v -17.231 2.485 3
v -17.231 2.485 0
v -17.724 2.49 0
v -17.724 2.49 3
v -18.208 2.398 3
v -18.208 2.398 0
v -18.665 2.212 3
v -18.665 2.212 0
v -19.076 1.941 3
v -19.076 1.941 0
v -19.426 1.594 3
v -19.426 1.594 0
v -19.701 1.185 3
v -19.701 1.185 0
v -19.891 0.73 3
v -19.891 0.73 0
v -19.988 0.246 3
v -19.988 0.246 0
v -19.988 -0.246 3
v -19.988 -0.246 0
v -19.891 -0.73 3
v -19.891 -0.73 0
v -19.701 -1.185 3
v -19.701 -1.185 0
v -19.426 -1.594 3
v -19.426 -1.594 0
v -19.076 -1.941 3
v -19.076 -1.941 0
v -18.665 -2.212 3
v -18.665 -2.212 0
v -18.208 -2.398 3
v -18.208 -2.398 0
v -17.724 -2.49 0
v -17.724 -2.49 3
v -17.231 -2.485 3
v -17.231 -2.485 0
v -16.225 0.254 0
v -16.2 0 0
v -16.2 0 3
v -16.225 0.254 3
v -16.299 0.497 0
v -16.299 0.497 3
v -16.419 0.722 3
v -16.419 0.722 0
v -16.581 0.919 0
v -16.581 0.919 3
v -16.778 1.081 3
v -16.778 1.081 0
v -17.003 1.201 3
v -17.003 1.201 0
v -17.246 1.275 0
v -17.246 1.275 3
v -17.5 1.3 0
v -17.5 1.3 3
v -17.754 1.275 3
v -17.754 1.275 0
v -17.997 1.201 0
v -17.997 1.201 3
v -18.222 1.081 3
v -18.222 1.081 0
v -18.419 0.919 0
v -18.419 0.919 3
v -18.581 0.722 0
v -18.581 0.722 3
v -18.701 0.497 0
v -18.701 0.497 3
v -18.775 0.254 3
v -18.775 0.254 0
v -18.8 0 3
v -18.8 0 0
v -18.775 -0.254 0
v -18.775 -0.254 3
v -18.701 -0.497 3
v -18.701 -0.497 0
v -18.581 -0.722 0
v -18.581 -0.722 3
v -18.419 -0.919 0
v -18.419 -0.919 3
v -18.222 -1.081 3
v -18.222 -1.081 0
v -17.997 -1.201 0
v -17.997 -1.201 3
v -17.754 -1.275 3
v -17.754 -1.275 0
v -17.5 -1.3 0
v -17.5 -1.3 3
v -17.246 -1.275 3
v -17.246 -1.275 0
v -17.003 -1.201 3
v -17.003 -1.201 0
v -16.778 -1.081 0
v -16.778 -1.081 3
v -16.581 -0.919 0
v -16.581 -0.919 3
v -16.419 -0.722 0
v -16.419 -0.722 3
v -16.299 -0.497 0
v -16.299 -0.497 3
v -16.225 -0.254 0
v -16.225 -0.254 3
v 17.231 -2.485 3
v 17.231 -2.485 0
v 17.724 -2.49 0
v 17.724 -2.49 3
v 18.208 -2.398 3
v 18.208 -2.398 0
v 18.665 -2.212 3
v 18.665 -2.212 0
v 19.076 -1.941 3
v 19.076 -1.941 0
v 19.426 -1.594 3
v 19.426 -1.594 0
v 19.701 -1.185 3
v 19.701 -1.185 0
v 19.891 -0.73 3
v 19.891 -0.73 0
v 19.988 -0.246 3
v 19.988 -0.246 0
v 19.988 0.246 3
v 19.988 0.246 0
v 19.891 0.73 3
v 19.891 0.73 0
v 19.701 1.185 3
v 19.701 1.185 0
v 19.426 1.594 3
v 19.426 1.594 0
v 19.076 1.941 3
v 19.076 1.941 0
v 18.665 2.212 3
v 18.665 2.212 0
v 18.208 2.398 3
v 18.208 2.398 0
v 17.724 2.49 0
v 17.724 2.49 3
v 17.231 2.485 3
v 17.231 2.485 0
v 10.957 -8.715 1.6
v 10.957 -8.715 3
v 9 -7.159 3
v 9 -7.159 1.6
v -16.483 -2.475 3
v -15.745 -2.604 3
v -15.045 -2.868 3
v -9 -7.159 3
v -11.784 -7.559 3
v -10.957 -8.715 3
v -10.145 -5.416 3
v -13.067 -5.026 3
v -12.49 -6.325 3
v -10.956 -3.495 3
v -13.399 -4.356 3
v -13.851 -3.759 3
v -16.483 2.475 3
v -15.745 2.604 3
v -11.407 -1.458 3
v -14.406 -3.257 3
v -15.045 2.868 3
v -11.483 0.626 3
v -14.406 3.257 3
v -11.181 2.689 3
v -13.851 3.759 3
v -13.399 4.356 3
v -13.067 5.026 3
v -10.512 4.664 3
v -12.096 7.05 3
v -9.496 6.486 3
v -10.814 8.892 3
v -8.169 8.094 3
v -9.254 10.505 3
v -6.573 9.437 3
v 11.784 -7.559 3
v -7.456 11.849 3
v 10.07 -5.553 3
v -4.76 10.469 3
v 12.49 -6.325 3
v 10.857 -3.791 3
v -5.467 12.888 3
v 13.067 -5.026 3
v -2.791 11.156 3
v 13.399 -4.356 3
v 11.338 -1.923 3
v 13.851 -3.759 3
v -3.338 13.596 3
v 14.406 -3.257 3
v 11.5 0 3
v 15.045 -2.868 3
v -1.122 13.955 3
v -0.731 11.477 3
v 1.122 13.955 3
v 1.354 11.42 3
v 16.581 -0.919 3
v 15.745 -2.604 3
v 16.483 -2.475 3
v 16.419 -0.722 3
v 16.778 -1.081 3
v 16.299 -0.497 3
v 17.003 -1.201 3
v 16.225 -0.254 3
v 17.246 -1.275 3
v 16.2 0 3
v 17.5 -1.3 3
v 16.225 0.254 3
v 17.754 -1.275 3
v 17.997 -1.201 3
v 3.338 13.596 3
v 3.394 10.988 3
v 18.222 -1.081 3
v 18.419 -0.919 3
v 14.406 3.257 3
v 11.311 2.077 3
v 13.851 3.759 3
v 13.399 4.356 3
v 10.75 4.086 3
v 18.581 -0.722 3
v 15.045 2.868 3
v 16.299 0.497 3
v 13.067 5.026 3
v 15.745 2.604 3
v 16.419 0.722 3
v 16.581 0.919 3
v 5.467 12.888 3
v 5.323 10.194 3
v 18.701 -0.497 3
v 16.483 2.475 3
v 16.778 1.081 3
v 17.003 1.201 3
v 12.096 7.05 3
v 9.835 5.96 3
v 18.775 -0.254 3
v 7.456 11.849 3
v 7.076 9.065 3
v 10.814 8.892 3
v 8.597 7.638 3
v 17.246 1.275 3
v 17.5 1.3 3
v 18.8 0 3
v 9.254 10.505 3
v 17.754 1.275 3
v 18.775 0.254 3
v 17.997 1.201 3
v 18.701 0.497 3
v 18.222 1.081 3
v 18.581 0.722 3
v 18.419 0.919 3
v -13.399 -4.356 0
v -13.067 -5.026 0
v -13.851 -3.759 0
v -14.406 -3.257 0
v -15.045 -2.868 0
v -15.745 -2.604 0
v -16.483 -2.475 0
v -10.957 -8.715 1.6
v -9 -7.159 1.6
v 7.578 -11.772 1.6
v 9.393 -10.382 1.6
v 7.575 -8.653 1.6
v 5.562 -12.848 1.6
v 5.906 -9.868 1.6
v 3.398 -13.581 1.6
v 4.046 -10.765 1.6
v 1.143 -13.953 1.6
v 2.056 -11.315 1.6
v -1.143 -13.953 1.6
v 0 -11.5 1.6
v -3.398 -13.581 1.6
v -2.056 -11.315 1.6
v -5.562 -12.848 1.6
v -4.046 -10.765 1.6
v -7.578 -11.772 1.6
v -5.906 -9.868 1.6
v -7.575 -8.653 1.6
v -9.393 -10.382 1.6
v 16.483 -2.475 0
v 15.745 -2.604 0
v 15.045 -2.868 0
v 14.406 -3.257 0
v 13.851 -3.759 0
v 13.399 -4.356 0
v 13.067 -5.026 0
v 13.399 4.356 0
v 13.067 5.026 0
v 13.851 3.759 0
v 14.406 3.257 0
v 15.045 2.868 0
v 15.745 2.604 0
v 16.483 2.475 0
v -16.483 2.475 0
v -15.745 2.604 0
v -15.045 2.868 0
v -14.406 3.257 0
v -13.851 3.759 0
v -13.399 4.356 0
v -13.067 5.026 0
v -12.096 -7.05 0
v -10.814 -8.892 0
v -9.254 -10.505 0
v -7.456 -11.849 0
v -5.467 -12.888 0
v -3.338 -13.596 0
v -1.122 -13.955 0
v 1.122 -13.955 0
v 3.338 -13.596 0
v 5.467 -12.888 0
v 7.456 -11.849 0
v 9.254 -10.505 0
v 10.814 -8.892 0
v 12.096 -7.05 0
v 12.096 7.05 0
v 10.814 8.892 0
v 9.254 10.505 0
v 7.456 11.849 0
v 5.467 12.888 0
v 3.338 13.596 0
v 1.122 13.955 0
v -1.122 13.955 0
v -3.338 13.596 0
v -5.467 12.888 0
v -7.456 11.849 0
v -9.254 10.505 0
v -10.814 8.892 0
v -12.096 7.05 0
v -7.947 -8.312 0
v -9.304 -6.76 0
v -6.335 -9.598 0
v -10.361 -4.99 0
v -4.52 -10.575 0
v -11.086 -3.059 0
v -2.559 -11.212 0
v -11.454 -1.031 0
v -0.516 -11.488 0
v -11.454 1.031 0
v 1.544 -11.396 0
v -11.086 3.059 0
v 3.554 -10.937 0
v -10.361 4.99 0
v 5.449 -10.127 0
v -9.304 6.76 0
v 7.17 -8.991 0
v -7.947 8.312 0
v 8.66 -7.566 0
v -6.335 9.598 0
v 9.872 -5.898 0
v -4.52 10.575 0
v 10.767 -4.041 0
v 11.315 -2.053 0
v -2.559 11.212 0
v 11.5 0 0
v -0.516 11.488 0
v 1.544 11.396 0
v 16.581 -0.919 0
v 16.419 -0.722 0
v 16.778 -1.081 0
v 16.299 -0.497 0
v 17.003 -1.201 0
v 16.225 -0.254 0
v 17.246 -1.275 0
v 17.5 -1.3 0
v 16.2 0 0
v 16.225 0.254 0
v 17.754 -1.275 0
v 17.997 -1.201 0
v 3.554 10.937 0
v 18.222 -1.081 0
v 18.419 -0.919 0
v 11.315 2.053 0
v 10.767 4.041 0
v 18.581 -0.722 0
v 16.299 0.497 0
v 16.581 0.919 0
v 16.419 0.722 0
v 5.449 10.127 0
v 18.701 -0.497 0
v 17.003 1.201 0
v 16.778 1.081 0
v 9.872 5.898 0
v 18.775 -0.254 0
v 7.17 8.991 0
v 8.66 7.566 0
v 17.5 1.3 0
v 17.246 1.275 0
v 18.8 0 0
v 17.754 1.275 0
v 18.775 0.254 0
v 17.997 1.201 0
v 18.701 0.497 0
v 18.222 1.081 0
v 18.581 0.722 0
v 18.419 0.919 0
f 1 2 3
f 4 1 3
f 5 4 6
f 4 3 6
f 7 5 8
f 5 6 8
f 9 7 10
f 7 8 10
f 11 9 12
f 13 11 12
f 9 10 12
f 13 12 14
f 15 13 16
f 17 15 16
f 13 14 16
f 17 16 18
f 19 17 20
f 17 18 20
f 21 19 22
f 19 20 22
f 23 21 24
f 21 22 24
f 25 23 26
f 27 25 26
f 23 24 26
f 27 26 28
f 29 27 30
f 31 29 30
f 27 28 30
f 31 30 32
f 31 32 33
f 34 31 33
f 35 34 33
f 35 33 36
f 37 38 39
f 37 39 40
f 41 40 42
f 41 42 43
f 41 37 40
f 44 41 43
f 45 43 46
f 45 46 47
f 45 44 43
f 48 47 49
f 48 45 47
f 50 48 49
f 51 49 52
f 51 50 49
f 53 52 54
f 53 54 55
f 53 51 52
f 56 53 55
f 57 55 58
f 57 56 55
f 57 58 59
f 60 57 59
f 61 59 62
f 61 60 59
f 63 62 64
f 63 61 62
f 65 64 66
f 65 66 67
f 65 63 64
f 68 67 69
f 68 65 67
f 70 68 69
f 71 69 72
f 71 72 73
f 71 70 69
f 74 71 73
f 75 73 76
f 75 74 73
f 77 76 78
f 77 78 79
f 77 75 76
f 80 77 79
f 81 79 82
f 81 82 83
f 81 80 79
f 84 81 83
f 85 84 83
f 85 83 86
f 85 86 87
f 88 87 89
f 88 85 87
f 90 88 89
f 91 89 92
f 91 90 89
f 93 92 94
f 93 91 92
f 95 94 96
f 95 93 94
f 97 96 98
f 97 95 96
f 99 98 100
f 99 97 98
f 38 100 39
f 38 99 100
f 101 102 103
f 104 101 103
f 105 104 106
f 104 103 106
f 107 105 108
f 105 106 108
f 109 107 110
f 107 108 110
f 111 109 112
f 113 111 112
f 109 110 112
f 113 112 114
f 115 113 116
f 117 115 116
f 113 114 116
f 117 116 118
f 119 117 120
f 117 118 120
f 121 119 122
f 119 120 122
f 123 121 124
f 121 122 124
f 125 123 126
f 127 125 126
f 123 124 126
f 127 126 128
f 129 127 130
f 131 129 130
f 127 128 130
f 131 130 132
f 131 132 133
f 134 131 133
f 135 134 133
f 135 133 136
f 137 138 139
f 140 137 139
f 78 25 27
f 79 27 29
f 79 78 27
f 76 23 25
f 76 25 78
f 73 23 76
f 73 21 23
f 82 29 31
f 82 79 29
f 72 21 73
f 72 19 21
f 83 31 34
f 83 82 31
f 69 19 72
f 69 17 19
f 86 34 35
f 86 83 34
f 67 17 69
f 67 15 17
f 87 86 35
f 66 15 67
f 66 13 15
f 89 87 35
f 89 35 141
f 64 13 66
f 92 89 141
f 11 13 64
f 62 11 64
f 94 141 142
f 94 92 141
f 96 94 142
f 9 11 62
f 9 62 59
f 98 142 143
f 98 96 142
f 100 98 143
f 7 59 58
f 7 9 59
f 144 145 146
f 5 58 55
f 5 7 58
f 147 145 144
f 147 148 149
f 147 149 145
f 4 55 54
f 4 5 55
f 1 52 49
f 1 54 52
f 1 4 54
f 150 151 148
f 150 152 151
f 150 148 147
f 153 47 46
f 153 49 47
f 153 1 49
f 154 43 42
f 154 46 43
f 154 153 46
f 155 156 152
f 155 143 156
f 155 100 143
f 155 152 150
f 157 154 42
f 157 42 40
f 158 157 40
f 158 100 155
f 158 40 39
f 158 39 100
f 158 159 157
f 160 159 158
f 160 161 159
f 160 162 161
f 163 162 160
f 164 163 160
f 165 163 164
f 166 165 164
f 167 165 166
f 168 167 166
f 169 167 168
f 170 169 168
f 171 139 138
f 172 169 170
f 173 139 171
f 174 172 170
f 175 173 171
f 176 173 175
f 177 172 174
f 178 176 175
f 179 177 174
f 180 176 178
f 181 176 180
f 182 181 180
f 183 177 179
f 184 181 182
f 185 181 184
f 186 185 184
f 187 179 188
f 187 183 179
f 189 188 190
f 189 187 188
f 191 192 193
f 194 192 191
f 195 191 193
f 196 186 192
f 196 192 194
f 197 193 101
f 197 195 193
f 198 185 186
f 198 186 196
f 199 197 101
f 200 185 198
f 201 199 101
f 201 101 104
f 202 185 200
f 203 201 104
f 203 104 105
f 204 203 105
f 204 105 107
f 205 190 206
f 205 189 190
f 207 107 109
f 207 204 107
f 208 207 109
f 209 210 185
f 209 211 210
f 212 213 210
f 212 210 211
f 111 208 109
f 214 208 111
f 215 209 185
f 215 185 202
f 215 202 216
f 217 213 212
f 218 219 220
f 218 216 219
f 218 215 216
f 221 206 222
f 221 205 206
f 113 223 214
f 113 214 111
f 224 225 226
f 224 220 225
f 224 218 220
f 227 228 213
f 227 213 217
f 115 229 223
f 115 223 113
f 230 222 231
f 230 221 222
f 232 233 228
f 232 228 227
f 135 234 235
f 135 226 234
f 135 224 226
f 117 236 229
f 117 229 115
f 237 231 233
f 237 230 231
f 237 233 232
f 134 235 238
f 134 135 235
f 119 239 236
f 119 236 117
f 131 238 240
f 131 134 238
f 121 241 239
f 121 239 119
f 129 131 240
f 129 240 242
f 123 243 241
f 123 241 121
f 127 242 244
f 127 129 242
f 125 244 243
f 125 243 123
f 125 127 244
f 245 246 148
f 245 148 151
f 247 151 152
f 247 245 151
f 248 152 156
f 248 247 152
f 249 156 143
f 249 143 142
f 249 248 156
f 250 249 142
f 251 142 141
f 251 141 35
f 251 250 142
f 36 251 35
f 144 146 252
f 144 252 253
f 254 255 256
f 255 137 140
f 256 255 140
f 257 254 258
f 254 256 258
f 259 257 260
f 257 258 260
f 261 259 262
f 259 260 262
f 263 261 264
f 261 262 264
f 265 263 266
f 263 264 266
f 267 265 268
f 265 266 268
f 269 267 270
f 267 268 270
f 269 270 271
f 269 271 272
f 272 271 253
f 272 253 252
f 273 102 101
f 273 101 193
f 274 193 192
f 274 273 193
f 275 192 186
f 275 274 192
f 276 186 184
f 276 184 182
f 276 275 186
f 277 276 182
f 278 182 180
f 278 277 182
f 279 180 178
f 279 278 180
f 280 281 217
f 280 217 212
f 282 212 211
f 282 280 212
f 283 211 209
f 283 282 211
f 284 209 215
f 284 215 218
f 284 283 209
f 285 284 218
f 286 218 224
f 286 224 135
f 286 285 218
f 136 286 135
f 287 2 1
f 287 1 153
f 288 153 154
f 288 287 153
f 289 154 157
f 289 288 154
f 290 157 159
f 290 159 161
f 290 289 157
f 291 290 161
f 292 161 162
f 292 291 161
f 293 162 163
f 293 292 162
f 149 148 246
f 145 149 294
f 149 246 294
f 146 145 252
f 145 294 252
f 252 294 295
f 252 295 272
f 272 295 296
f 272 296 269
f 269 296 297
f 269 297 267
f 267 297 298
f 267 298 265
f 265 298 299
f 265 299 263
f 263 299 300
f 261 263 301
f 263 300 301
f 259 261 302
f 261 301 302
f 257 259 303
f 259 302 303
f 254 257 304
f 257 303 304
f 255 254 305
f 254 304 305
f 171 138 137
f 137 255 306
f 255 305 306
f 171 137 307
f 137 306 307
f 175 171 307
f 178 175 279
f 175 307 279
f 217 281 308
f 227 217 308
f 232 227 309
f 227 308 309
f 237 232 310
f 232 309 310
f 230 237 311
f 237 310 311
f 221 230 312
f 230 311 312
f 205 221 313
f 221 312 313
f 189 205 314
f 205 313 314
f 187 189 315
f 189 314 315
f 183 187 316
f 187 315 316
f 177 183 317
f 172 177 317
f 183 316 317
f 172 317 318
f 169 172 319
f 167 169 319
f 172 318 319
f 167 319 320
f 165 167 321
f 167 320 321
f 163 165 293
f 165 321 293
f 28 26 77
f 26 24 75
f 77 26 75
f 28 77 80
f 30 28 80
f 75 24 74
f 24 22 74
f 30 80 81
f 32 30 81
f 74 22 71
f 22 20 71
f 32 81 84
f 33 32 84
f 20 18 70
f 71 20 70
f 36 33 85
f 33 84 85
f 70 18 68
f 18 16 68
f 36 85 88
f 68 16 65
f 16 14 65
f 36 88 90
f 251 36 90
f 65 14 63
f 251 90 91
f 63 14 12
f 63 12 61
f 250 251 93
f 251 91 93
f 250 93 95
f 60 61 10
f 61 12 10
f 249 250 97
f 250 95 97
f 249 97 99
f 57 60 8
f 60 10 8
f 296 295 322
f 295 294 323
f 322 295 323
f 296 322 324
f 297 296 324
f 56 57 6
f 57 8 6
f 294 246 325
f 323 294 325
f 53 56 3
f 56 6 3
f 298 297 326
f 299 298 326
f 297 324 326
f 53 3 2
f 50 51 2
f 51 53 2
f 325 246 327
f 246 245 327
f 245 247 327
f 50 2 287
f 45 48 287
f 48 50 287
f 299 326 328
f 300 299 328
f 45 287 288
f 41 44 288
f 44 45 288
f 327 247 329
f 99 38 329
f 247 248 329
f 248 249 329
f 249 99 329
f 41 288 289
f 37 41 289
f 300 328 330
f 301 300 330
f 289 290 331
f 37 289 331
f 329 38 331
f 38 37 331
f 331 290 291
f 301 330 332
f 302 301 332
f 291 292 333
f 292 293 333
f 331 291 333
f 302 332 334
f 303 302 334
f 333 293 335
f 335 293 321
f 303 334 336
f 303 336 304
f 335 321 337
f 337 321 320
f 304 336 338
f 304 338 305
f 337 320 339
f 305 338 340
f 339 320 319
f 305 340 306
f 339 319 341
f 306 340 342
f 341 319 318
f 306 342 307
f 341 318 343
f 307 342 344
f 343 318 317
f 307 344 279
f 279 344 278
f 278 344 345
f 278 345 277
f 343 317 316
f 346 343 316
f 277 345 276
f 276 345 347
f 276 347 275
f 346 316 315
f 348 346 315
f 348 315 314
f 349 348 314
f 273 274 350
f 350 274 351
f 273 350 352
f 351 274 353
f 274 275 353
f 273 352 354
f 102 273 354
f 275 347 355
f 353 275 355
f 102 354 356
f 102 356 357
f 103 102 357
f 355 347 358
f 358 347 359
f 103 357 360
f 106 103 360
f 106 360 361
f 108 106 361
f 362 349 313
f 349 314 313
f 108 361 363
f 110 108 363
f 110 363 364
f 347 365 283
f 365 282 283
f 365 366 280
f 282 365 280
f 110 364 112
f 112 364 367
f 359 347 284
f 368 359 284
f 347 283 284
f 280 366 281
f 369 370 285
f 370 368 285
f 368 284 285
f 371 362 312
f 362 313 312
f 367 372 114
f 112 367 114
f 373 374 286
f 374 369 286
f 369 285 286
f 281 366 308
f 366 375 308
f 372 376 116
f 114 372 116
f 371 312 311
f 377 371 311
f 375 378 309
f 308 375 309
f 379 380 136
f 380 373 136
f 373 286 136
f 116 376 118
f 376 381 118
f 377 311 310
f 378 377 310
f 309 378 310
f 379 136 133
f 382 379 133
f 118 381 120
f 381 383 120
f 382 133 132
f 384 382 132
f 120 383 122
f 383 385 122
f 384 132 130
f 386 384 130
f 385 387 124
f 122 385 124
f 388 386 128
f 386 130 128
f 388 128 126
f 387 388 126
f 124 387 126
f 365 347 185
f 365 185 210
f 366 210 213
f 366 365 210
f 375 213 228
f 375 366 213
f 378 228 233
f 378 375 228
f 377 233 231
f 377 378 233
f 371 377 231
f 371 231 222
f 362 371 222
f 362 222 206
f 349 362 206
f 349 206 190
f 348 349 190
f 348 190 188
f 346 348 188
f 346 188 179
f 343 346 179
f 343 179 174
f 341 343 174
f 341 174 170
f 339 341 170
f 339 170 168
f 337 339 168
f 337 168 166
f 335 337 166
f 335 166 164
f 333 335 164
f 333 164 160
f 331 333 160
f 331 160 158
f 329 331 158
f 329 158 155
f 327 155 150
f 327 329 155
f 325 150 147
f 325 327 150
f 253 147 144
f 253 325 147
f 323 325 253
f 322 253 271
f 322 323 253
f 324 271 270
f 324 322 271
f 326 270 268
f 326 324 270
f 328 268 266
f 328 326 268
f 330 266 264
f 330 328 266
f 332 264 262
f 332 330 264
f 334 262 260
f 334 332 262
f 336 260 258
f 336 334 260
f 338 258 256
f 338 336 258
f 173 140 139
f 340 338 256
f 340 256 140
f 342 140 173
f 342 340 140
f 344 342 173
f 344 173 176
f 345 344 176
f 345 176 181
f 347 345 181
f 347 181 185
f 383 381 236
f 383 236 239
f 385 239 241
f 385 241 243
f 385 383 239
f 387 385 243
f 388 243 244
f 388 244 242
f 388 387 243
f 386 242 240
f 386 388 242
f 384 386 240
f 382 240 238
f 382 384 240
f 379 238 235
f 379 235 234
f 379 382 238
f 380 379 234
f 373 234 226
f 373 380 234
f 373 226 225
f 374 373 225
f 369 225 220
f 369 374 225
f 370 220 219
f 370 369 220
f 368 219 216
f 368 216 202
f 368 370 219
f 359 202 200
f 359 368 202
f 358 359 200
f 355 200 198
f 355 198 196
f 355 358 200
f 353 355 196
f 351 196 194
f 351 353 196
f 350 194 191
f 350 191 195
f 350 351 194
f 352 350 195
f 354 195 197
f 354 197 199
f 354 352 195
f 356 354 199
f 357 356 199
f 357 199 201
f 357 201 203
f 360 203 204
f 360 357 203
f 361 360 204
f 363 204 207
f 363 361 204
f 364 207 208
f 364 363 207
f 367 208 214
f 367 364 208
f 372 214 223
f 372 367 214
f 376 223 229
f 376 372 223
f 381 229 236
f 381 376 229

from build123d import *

# Parameters (mm, degrees)
SKETCH_R     = 11.5
SKETCH_R_2   = 1.3
PAD_DEPTH    = 3
POCKET_DEPTH = 1.4


with BuildPart() as part:
    # Sketch → Pad (new body)
    with BuildSketch(Plane.XY):
        with BuildLine():
            ThreePointArc((13.066667, 5.026154), (0, 14), (-13.066667, 5.026154))
            ThreePointArc((-17.230769, 2.485461), (-14.71661, 3.047599), (-13.066667, 5.026154))
            ThreePointArc((-17.230769, 2.485461), (-20, 0), (-17.230769, -2.485461))
            ThreePointArc((-13.066667, -5.026154), (-14.71661, -3.047599), (-17.230769, -2.485461))
            ThreePointArc((-13.066667, -5.026154), (0, -14), (13.066667, -5.026154))
            ThreePointArc((17.230769, -2.485461), (14.71661, -3.047599), (13.066667, -5.026154))
            ThreePointArc((17.230769, -2.485461), (20, 0), (17.230769, 2.485461))
            ThreePointArc((13.066667, 5.026154), (14.71661, 3.047599), (17.230769, 2.485461))
        make_face()
        Circle(SKETCH_R, mode=Mode.SUBTRACT)
        with Locations((-17.5, 0)):
            Circle(SKETCH_R_2, mode=Mode.SUBTRACT)
        with Locations((17.5, 0)):
            Circle(SKETCH_R_2, mode=Mode.SUBTRACT)
    extrude(amount=PAD_DEPTH)

    # Sketch001 (on Face13 of Pad) → Pocket (cut)
    with BuildSketch(Plane.XY.offset(3)):
        with BuildLine():
            ThreePointArc((-9, -7.158911), (0, -11.5), (9, -7.158911))
            Line((10.956522, -8.715195), (9, -7.158911))
            ThreePointArc((-10.956522, -8.715195), (0, -14), (10.956522, -8.715195))
            Line((-10.956522, -8.715195), (-9, -7.158911))
        make_face()
    extrude(amount=-POCKET_DEPTH, mode=Mode.SUBTRACT)


solid = part.part
